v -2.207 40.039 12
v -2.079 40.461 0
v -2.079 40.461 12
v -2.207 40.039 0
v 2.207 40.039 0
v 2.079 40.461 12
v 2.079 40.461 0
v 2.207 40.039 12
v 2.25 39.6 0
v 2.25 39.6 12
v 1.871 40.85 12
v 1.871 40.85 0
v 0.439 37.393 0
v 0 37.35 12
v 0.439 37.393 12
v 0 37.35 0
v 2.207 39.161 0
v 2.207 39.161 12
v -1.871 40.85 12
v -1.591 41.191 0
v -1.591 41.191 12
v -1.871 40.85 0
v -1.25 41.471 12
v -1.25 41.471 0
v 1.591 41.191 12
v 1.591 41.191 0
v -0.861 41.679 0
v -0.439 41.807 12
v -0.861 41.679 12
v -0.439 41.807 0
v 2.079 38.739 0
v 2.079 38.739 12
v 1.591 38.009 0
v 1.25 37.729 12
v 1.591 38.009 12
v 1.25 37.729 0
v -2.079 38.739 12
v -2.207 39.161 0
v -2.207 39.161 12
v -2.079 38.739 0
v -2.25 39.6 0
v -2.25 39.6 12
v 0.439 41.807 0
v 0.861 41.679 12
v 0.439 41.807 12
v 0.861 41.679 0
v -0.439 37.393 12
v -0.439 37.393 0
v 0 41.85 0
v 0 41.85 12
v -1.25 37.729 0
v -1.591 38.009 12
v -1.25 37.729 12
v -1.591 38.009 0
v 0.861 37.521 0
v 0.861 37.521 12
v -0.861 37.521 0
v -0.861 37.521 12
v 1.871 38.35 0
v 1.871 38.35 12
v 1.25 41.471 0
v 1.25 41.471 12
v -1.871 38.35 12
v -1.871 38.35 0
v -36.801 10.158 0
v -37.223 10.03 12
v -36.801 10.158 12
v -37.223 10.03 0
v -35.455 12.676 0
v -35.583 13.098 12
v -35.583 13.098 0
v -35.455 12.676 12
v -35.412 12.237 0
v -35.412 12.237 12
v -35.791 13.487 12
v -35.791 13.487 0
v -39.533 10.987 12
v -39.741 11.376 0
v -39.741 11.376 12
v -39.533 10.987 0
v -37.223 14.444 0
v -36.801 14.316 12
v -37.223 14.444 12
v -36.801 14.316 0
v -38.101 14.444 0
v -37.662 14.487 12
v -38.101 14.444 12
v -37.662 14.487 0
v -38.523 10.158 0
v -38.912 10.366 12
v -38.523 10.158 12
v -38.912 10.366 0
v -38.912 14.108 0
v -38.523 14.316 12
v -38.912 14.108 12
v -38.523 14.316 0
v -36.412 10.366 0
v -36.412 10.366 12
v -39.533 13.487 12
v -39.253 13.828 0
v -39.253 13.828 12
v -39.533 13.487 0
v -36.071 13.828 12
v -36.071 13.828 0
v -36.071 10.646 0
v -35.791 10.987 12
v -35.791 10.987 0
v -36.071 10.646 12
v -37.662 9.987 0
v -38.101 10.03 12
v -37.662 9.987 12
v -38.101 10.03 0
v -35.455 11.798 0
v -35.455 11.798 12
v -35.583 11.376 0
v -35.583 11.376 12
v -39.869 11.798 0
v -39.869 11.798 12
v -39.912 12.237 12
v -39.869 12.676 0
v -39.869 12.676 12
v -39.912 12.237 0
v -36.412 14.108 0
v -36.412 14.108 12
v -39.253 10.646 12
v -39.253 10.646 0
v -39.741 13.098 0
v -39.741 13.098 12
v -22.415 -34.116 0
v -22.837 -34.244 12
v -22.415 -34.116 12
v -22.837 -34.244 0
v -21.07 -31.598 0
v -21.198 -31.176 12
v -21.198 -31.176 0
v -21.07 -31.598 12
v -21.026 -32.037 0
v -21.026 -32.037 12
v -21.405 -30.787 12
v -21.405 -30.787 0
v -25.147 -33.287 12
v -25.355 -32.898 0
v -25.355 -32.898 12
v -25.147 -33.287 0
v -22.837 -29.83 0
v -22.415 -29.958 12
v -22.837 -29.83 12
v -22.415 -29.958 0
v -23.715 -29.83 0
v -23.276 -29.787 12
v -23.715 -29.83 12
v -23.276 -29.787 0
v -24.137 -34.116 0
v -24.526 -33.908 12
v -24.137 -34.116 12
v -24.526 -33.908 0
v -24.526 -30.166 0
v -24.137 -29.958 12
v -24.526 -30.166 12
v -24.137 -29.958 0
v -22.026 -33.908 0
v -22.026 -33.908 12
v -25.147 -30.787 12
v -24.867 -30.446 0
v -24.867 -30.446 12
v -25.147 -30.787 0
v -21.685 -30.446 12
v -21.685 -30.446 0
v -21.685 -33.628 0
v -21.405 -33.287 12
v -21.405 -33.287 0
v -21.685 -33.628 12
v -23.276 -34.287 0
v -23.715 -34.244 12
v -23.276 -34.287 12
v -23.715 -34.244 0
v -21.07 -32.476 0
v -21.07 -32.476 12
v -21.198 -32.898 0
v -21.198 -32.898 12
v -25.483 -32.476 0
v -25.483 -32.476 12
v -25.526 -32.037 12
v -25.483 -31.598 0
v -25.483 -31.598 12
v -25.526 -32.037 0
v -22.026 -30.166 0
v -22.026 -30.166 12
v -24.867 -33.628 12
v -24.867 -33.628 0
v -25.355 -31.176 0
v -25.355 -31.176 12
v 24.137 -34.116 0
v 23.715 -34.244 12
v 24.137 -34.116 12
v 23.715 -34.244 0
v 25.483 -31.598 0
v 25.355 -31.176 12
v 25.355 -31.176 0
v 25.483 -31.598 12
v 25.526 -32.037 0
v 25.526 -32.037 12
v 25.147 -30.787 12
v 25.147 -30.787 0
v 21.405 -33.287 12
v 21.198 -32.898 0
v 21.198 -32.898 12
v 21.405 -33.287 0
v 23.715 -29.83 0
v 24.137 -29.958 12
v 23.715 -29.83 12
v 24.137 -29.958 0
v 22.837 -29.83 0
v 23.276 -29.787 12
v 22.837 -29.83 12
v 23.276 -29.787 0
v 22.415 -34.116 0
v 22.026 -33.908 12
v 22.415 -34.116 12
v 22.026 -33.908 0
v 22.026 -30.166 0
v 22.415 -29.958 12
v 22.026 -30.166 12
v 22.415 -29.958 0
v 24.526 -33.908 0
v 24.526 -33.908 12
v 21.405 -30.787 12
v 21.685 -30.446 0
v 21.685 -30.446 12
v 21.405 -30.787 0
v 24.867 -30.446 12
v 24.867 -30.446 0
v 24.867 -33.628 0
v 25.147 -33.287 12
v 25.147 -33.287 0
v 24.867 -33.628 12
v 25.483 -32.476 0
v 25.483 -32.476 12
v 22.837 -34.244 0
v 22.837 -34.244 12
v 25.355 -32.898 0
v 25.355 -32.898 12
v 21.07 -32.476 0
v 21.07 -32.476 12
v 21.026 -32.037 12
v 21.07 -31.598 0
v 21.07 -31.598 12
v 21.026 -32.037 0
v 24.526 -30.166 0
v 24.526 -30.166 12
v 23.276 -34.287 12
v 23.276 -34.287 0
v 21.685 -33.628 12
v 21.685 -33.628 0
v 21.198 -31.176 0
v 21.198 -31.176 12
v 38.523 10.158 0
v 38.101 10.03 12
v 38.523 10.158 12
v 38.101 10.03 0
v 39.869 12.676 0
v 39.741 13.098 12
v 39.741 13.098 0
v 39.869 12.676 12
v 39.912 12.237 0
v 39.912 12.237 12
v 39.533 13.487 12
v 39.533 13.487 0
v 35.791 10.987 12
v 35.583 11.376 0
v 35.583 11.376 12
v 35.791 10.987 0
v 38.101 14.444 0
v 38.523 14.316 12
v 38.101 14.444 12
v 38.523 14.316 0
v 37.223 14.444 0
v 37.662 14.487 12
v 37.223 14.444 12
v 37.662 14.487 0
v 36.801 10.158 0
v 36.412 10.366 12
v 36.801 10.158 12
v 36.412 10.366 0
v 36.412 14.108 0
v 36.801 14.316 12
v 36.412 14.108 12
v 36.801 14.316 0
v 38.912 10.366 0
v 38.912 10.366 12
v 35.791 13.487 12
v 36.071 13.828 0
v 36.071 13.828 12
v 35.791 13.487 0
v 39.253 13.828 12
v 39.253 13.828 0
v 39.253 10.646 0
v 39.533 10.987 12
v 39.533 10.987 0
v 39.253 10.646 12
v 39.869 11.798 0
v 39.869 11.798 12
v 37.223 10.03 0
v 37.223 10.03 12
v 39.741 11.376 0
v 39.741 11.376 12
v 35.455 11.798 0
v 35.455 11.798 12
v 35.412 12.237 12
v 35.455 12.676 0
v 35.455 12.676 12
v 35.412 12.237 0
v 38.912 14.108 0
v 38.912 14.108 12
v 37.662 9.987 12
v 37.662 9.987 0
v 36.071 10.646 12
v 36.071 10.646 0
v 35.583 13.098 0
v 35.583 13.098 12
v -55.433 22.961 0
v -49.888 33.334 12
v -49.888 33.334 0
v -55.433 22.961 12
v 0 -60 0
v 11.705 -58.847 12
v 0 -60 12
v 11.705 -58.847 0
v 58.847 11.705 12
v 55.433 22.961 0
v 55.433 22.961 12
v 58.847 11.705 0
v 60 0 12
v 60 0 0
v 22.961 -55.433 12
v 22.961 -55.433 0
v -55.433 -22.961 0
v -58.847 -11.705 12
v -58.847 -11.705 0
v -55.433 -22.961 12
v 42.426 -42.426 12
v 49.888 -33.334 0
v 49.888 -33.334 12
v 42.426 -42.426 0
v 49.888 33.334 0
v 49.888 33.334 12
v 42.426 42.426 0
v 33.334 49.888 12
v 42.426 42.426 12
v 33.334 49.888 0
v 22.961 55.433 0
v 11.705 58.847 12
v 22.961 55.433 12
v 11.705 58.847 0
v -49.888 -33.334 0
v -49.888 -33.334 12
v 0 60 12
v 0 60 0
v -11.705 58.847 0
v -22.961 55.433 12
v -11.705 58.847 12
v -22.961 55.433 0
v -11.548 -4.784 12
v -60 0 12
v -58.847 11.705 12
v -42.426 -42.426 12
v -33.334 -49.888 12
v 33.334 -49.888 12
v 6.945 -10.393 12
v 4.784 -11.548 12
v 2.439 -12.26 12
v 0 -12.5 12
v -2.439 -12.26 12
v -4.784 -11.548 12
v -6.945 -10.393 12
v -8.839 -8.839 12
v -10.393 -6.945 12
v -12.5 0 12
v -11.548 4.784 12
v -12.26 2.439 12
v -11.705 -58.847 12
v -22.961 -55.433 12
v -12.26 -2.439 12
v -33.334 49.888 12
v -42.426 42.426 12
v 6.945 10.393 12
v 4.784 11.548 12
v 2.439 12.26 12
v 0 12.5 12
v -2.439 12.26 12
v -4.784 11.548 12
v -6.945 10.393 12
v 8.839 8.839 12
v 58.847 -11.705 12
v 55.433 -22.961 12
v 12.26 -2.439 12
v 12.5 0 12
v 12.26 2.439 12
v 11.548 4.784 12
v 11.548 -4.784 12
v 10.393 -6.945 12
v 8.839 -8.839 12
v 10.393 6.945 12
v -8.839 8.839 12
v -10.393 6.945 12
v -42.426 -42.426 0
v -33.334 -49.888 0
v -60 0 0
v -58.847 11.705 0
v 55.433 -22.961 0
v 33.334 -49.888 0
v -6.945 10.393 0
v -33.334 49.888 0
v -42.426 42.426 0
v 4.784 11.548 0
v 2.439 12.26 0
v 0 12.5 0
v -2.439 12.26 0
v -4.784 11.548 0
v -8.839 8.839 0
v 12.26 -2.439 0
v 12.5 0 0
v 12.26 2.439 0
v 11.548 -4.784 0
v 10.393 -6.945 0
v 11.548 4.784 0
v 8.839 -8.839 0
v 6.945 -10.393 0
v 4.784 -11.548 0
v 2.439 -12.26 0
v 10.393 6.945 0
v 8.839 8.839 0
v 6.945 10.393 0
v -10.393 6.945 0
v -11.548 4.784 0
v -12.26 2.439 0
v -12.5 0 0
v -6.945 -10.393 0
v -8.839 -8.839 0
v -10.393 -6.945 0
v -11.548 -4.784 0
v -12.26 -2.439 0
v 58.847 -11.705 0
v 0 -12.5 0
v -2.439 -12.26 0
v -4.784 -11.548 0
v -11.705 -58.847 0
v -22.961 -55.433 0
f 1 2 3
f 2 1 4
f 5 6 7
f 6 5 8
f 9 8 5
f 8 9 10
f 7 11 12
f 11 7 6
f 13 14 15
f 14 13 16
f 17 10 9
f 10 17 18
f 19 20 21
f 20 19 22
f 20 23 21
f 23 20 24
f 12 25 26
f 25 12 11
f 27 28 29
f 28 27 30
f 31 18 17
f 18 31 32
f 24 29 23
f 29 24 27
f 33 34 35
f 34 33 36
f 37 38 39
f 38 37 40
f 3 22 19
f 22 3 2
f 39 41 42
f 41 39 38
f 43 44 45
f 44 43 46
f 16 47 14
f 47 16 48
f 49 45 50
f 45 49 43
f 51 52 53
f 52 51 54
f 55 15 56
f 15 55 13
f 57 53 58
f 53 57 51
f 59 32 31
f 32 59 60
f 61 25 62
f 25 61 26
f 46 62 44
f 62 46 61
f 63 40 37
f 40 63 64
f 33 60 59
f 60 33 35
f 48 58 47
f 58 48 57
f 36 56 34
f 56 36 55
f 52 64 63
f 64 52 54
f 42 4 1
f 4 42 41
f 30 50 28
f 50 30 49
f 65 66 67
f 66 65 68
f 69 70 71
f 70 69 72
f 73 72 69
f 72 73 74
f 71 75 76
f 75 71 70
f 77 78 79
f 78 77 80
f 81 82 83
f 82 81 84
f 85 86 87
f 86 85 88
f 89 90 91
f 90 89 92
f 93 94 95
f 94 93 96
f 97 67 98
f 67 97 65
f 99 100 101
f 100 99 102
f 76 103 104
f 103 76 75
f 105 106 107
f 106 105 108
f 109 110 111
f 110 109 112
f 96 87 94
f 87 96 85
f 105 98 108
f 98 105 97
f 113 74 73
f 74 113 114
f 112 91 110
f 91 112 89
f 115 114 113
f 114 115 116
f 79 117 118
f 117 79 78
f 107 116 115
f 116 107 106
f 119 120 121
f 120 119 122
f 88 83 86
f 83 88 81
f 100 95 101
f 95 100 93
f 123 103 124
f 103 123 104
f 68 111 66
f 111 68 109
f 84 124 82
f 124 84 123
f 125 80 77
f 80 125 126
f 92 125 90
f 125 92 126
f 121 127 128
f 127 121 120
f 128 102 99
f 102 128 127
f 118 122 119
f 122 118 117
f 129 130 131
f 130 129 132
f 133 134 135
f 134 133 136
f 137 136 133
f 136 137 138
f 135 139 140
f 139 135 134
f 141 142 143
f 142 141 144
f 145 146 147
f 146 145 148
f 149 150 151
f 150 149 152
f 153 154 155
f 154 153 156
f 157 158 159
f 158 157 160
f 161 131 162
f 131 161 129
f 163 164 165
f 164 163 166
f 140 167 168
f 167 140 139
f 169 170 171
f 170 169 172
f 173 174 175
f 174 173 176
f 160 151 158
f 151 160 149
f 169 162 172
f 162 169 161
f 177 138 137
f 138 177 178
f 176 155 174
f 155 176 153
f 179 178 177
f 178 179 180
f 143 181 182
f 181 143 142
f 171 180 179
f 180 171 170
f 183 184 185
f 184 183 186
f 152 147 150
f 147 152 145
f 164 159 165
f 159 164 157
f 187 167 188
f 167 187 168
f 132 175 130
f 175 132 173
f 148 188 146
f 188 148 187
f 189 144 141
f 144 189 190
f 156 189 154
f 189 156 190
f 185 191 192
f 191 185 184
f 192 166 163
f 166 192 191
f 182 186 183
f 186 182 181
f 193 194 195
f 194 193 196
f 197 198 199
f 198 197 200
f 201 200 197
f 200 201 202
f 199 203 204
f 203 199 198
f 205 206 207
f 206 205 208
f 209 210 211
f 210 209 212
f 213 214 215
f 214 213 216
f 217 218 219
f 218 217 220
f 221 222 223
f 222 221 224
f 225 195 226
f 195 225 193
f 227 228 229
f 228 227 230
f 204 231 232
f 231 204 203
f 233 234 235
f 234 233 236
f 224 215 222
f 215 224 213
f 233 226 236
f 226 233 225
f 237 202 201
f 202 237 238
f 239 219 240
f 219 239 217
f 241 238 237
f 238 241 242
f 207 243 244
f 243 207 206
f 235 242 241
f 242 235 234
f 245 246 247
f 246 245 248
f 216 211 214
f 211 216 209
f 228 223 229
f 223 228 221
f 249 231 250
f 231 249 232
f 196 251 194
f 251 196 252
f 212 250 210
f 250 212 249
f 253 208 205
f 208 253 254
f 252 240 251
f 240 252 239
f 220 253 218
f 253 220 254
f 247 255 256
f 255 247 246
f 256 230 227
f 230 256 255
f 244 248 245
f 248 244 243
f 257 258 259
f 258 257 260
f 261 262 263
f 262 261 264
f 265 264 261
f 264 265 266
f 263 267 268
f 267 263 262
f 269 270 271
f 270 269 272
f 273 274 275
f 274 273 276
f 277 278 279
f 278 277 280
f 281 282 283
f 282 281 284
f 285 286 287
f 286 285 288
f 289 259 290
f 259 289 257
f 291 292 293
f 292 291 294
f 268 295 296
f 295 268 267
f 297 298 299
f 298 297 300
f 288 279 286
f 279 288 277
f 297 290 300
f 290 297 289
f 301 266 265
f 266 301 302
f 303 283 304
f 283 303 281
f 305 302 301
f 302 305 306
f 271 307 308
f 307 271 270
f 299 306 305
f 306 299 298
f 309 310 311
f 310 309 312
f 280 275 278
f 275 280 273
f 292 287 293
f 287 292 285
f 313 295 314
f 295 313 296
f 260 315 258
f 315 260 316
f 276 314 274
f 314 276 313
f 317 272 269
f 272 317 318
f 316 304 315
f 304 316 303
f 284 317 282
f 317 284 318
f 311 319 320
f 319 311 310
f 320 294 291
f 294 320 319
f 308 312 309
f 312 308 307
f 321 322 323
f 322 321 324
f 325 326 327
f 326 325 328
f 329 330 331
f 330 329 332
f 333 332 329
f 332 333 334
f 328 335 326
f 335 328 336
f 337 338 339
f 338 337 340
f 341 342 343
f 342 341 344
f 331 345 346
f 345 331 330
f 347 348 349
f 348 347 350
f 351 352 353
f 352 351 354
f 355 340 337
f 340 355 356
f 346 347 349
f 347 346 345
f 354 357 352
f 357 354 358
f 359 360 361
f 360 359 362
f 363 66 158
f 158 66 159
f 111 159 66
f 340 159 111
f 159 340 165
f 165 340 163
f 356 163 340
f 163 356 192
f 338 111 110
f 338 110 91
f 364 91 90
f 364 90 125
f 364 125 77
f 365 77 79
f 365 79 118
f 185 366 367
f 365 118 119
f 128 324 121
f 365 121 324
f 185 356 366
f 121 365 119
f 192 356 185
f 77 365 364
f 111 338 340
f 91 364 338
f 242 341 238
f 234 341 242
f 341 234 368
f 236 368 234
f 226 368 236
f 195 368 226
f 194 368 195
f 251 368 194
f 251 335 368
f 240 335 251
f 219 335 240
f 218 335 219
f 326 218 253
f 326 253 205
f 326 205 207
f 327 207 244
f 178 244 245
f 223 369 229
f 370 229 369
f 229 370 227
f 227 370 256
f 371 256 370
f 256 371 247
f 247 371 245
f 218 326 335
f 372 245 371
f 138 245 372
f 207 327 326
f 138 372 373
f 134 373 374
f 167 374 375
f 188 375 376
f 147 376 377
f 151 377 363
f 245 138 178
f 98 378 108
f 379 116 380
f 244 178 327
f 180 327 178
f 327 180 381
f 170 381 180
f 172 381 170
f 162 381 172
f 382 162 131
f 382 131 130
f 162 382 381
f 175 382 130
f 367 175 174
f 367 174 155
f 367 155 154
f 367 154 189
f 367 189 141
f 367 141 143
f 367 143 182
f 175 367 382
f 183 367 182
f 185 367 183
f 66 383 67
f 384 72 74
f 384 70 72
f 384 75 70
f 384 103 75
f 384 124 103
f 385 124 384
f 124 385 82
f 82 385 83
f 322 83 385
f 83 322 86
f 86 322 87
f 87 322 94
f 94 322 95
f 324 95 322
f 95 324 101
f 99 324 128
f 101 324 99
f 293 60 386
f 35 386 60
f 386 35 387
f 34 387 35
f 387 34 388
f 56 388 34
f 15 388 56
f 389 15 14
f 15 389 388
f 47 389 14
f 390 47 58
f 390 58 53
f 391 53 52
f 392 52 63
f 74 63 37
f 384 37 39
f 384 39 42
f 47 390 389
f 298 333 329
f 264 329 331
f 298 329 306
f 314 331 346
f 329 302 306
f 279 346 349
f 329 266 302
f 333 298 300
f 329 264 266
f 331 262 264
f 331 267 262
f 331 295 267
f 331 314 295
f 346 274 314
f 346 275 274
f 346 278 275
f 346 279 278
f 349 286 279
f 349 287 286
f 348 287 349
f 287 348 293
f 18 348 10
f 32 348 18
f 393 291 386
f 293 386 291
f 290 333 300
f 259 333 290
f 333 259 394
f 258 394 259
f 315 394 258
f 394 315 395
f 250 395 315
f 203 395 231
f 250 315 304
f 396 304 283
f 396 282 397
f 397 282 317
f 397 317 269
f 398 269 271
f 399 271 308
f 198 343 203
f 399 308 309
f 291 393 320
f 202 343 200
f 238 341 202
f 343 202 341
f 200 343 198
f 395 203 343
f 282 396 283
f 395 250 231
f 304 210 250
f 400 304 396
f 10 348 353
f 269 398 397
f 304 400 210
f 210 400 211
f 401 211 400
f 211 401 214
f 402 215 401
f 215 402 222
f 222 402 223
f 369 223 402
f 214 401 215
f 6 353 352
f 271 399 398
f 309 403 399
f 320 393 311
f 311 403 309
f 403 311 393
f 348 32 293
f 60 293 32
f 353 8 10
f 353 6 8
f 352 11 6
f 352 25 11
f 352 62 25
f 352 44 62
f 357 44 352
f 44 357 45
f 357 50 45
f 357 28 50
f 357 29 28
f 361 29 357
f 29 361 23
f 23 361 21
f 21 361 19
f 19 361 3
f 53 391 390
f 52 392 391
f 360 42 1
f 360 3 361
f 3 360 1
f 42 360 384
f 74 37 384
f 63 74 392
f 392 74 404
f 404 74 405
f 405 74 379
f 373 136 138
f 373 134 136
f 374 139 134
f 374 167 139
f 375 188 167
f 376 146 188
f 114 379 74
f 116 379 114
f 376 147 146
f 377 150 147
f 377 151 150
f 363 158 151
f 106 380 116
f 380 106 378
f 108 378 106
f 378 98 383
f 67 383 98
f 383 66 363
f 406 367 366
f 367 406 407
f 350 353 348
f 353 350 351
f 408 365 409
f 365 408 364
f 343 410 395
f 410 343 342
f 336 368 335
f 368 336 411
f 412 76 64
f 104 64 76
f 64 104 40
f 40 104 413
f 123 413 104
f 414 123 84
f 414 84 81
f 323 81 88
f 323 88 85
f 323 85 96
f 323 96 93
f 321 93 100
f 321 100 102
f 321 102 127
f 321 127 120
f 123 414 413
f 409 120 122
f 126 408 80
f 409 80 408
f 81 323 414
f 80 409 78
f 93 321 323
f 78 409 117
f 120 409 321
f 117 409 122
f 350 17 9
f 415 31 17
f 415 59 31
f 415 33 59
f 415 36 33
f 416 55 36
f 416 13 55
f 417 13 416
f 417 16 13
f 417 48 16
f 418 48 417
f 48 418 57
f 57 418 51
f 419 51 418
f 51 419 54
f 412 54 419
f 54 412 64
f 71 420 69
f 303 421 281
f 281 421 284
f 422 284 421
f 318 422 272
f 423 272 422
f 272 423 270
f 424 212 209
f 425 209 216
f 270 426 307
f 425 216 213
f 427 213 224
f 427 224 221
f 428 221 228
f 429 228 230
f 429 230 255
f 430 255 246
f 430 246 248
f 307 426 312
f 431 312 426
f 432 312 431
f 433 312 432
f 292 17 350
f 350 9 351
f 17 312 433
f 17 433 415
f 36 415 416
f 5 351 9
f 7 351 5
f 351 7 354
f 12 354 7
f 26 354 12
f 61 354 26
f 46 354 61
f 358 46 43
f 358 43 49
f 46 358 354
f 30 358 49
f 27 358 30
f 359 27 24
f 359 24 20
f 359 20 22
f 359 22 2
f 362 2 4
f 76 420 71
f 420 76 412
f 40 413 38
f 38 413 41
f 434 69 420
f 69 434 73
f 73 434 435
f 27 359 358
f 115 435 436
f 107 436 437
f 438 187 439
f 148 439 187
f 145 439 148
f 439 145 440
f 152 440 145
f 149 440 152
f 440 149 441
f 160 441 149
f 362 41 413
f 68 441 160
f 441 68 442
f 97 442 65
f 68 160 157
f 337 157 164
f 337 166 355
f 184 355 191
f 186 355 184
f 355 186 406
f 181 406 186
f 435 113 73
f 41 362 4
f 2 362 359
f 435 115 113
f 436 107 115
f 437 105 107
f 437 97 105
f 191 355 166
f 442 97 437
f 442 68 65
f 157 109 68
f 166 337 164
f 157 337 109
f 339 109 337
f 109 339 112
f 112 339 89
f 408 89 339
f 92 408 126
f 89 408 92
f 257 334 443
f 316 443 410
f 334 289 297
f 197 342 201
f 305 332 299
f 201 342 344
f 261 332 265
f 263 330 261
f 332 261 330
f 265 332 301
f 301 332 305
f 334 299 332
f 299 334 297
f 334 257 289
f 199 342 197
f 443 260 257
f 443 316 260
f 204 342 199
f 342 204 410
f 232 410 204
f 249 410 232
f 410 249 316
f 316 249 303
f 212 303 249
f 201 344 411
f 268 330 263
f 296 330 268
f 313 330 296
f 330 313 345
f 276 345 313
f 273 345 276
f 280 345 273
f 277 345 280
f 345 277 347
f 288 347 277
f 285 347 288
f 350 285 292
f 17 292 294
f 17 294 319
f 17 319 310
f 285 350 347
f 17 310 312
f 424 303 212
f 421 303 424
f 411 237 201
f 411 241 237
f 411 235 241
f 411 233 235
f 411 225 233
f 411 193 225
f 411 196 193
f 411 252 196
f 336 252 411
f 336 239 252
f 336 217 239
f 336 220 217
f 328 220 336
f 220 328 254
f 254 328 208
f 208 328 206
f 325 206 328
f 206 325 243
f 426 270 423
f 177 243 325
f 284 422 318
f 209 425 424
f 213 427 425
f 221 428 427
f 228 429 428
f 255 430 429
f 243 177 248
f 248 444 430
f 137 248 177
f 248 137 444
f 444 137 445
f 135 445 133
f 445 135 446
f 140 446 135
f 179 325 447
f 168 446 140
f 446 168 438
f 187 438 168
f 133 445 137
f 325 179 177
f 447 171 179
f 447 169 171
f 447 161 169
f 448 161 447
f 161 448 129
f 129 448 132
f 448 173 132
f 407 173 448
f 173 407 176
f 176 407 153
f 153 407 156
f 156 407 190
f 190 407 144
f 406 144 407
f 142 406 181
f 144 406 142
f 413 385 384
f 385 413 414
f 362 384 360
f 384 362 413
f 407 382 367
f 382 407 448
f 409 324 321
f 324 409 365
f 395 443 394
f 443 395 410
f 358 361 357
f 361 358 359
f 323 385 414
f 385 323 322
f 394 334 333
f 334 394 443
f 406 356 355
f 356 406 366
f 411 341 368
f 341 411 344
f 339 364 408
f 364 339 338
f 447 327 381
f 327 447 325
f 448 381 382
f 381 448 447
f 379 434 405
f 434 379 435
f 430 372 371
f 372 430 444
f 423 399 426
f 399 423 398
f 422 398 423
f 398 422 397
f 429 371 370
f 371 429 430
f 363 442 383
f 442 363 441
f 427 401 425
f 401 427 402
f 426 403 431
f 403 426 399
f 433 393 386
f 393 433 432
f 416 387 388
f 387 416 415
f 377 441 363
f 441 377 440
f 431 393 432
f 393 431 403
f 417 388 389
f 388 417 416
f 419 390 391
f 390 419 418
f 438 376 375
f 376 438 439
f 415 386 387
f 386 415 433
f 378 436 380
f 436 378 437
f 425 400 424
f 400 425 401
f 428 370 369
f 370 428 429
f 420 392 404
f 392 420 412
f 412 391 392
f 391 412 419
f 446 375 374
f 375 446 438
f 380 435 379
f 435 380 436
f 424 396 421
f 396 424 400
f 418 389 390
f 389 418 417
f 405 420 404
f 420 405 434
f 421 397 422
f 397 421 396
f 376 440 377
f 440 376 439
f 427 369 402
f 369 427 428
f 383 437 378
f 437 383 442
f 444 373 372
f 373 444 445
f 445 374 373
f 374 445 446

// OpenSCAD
$fn = 32;

// ----------------------------------------------------------------------
// Flange Ø120 x 12
// 5 holes on a Ø79.2 bolt circle, bolted joints
// ----------------------------------------------------------------------

// --- parameters (mm) ---
flange_d = 120;  // outside diameter of the flange
thickness = 12;  // flange thickness
holes = 5;       // number of bolt holes
pcd = 79.2;      // bolt circle diameter
start_deg = 90;  // angle of the first hole, from +X
hole_d = 4.5;    // bolt hole diameter
bore_d = 25;     // central through bore
hub_d = 33;      // hub outside diameter
hub_h = 0;       // hub height above the flange face (0 = no hub)

// --- derived feature positions (mm) ---
height = thickness + hub_h;  // = 12   overall height of the part
pcd_r = pcd / 2;             // = 39.6   bolt circle radius
hole_step = 360 / holes;     // = 72   angular pitch
feature_centers = [
  [pcd_r * cos(start_deg + 0 * hole_step), pcd_r * sin(start_deg + 0 * hole_step)],
  [pcd_r * cos(start_deg + 1 * hole_step), pcd_r * sin(start_deg + 1 * hole_step)],
  [pcd_r * cos(start_deg + 2 * hole_step), pcd_r * sin(start_deg + 2 * hole_step)],
  [pcd_r * cos(start_deg + 3 * hole_step), pcd_r * sin(start_deg + 3 * hole_step)],
  [pcd_r * cos(start_deg + 4 * hole_step), pcd_r * sin(start_deg + 4 * hole_step)]
];   // bolt hole centres on the pitch circle

// flange disc, every hole and the bore cut straight through
difference() {
  union() {
    cylinder(d = flange_d, h = thickness);
  }
  translate([0, 0, -1]) cylinder(d = bore_d, h = height + 2);  // bore, through
  for (centre = feature_centers)
    translate([centre[0], centre[1], -1]) cylinder(d = hole_d, h = thickness + 2);
}
